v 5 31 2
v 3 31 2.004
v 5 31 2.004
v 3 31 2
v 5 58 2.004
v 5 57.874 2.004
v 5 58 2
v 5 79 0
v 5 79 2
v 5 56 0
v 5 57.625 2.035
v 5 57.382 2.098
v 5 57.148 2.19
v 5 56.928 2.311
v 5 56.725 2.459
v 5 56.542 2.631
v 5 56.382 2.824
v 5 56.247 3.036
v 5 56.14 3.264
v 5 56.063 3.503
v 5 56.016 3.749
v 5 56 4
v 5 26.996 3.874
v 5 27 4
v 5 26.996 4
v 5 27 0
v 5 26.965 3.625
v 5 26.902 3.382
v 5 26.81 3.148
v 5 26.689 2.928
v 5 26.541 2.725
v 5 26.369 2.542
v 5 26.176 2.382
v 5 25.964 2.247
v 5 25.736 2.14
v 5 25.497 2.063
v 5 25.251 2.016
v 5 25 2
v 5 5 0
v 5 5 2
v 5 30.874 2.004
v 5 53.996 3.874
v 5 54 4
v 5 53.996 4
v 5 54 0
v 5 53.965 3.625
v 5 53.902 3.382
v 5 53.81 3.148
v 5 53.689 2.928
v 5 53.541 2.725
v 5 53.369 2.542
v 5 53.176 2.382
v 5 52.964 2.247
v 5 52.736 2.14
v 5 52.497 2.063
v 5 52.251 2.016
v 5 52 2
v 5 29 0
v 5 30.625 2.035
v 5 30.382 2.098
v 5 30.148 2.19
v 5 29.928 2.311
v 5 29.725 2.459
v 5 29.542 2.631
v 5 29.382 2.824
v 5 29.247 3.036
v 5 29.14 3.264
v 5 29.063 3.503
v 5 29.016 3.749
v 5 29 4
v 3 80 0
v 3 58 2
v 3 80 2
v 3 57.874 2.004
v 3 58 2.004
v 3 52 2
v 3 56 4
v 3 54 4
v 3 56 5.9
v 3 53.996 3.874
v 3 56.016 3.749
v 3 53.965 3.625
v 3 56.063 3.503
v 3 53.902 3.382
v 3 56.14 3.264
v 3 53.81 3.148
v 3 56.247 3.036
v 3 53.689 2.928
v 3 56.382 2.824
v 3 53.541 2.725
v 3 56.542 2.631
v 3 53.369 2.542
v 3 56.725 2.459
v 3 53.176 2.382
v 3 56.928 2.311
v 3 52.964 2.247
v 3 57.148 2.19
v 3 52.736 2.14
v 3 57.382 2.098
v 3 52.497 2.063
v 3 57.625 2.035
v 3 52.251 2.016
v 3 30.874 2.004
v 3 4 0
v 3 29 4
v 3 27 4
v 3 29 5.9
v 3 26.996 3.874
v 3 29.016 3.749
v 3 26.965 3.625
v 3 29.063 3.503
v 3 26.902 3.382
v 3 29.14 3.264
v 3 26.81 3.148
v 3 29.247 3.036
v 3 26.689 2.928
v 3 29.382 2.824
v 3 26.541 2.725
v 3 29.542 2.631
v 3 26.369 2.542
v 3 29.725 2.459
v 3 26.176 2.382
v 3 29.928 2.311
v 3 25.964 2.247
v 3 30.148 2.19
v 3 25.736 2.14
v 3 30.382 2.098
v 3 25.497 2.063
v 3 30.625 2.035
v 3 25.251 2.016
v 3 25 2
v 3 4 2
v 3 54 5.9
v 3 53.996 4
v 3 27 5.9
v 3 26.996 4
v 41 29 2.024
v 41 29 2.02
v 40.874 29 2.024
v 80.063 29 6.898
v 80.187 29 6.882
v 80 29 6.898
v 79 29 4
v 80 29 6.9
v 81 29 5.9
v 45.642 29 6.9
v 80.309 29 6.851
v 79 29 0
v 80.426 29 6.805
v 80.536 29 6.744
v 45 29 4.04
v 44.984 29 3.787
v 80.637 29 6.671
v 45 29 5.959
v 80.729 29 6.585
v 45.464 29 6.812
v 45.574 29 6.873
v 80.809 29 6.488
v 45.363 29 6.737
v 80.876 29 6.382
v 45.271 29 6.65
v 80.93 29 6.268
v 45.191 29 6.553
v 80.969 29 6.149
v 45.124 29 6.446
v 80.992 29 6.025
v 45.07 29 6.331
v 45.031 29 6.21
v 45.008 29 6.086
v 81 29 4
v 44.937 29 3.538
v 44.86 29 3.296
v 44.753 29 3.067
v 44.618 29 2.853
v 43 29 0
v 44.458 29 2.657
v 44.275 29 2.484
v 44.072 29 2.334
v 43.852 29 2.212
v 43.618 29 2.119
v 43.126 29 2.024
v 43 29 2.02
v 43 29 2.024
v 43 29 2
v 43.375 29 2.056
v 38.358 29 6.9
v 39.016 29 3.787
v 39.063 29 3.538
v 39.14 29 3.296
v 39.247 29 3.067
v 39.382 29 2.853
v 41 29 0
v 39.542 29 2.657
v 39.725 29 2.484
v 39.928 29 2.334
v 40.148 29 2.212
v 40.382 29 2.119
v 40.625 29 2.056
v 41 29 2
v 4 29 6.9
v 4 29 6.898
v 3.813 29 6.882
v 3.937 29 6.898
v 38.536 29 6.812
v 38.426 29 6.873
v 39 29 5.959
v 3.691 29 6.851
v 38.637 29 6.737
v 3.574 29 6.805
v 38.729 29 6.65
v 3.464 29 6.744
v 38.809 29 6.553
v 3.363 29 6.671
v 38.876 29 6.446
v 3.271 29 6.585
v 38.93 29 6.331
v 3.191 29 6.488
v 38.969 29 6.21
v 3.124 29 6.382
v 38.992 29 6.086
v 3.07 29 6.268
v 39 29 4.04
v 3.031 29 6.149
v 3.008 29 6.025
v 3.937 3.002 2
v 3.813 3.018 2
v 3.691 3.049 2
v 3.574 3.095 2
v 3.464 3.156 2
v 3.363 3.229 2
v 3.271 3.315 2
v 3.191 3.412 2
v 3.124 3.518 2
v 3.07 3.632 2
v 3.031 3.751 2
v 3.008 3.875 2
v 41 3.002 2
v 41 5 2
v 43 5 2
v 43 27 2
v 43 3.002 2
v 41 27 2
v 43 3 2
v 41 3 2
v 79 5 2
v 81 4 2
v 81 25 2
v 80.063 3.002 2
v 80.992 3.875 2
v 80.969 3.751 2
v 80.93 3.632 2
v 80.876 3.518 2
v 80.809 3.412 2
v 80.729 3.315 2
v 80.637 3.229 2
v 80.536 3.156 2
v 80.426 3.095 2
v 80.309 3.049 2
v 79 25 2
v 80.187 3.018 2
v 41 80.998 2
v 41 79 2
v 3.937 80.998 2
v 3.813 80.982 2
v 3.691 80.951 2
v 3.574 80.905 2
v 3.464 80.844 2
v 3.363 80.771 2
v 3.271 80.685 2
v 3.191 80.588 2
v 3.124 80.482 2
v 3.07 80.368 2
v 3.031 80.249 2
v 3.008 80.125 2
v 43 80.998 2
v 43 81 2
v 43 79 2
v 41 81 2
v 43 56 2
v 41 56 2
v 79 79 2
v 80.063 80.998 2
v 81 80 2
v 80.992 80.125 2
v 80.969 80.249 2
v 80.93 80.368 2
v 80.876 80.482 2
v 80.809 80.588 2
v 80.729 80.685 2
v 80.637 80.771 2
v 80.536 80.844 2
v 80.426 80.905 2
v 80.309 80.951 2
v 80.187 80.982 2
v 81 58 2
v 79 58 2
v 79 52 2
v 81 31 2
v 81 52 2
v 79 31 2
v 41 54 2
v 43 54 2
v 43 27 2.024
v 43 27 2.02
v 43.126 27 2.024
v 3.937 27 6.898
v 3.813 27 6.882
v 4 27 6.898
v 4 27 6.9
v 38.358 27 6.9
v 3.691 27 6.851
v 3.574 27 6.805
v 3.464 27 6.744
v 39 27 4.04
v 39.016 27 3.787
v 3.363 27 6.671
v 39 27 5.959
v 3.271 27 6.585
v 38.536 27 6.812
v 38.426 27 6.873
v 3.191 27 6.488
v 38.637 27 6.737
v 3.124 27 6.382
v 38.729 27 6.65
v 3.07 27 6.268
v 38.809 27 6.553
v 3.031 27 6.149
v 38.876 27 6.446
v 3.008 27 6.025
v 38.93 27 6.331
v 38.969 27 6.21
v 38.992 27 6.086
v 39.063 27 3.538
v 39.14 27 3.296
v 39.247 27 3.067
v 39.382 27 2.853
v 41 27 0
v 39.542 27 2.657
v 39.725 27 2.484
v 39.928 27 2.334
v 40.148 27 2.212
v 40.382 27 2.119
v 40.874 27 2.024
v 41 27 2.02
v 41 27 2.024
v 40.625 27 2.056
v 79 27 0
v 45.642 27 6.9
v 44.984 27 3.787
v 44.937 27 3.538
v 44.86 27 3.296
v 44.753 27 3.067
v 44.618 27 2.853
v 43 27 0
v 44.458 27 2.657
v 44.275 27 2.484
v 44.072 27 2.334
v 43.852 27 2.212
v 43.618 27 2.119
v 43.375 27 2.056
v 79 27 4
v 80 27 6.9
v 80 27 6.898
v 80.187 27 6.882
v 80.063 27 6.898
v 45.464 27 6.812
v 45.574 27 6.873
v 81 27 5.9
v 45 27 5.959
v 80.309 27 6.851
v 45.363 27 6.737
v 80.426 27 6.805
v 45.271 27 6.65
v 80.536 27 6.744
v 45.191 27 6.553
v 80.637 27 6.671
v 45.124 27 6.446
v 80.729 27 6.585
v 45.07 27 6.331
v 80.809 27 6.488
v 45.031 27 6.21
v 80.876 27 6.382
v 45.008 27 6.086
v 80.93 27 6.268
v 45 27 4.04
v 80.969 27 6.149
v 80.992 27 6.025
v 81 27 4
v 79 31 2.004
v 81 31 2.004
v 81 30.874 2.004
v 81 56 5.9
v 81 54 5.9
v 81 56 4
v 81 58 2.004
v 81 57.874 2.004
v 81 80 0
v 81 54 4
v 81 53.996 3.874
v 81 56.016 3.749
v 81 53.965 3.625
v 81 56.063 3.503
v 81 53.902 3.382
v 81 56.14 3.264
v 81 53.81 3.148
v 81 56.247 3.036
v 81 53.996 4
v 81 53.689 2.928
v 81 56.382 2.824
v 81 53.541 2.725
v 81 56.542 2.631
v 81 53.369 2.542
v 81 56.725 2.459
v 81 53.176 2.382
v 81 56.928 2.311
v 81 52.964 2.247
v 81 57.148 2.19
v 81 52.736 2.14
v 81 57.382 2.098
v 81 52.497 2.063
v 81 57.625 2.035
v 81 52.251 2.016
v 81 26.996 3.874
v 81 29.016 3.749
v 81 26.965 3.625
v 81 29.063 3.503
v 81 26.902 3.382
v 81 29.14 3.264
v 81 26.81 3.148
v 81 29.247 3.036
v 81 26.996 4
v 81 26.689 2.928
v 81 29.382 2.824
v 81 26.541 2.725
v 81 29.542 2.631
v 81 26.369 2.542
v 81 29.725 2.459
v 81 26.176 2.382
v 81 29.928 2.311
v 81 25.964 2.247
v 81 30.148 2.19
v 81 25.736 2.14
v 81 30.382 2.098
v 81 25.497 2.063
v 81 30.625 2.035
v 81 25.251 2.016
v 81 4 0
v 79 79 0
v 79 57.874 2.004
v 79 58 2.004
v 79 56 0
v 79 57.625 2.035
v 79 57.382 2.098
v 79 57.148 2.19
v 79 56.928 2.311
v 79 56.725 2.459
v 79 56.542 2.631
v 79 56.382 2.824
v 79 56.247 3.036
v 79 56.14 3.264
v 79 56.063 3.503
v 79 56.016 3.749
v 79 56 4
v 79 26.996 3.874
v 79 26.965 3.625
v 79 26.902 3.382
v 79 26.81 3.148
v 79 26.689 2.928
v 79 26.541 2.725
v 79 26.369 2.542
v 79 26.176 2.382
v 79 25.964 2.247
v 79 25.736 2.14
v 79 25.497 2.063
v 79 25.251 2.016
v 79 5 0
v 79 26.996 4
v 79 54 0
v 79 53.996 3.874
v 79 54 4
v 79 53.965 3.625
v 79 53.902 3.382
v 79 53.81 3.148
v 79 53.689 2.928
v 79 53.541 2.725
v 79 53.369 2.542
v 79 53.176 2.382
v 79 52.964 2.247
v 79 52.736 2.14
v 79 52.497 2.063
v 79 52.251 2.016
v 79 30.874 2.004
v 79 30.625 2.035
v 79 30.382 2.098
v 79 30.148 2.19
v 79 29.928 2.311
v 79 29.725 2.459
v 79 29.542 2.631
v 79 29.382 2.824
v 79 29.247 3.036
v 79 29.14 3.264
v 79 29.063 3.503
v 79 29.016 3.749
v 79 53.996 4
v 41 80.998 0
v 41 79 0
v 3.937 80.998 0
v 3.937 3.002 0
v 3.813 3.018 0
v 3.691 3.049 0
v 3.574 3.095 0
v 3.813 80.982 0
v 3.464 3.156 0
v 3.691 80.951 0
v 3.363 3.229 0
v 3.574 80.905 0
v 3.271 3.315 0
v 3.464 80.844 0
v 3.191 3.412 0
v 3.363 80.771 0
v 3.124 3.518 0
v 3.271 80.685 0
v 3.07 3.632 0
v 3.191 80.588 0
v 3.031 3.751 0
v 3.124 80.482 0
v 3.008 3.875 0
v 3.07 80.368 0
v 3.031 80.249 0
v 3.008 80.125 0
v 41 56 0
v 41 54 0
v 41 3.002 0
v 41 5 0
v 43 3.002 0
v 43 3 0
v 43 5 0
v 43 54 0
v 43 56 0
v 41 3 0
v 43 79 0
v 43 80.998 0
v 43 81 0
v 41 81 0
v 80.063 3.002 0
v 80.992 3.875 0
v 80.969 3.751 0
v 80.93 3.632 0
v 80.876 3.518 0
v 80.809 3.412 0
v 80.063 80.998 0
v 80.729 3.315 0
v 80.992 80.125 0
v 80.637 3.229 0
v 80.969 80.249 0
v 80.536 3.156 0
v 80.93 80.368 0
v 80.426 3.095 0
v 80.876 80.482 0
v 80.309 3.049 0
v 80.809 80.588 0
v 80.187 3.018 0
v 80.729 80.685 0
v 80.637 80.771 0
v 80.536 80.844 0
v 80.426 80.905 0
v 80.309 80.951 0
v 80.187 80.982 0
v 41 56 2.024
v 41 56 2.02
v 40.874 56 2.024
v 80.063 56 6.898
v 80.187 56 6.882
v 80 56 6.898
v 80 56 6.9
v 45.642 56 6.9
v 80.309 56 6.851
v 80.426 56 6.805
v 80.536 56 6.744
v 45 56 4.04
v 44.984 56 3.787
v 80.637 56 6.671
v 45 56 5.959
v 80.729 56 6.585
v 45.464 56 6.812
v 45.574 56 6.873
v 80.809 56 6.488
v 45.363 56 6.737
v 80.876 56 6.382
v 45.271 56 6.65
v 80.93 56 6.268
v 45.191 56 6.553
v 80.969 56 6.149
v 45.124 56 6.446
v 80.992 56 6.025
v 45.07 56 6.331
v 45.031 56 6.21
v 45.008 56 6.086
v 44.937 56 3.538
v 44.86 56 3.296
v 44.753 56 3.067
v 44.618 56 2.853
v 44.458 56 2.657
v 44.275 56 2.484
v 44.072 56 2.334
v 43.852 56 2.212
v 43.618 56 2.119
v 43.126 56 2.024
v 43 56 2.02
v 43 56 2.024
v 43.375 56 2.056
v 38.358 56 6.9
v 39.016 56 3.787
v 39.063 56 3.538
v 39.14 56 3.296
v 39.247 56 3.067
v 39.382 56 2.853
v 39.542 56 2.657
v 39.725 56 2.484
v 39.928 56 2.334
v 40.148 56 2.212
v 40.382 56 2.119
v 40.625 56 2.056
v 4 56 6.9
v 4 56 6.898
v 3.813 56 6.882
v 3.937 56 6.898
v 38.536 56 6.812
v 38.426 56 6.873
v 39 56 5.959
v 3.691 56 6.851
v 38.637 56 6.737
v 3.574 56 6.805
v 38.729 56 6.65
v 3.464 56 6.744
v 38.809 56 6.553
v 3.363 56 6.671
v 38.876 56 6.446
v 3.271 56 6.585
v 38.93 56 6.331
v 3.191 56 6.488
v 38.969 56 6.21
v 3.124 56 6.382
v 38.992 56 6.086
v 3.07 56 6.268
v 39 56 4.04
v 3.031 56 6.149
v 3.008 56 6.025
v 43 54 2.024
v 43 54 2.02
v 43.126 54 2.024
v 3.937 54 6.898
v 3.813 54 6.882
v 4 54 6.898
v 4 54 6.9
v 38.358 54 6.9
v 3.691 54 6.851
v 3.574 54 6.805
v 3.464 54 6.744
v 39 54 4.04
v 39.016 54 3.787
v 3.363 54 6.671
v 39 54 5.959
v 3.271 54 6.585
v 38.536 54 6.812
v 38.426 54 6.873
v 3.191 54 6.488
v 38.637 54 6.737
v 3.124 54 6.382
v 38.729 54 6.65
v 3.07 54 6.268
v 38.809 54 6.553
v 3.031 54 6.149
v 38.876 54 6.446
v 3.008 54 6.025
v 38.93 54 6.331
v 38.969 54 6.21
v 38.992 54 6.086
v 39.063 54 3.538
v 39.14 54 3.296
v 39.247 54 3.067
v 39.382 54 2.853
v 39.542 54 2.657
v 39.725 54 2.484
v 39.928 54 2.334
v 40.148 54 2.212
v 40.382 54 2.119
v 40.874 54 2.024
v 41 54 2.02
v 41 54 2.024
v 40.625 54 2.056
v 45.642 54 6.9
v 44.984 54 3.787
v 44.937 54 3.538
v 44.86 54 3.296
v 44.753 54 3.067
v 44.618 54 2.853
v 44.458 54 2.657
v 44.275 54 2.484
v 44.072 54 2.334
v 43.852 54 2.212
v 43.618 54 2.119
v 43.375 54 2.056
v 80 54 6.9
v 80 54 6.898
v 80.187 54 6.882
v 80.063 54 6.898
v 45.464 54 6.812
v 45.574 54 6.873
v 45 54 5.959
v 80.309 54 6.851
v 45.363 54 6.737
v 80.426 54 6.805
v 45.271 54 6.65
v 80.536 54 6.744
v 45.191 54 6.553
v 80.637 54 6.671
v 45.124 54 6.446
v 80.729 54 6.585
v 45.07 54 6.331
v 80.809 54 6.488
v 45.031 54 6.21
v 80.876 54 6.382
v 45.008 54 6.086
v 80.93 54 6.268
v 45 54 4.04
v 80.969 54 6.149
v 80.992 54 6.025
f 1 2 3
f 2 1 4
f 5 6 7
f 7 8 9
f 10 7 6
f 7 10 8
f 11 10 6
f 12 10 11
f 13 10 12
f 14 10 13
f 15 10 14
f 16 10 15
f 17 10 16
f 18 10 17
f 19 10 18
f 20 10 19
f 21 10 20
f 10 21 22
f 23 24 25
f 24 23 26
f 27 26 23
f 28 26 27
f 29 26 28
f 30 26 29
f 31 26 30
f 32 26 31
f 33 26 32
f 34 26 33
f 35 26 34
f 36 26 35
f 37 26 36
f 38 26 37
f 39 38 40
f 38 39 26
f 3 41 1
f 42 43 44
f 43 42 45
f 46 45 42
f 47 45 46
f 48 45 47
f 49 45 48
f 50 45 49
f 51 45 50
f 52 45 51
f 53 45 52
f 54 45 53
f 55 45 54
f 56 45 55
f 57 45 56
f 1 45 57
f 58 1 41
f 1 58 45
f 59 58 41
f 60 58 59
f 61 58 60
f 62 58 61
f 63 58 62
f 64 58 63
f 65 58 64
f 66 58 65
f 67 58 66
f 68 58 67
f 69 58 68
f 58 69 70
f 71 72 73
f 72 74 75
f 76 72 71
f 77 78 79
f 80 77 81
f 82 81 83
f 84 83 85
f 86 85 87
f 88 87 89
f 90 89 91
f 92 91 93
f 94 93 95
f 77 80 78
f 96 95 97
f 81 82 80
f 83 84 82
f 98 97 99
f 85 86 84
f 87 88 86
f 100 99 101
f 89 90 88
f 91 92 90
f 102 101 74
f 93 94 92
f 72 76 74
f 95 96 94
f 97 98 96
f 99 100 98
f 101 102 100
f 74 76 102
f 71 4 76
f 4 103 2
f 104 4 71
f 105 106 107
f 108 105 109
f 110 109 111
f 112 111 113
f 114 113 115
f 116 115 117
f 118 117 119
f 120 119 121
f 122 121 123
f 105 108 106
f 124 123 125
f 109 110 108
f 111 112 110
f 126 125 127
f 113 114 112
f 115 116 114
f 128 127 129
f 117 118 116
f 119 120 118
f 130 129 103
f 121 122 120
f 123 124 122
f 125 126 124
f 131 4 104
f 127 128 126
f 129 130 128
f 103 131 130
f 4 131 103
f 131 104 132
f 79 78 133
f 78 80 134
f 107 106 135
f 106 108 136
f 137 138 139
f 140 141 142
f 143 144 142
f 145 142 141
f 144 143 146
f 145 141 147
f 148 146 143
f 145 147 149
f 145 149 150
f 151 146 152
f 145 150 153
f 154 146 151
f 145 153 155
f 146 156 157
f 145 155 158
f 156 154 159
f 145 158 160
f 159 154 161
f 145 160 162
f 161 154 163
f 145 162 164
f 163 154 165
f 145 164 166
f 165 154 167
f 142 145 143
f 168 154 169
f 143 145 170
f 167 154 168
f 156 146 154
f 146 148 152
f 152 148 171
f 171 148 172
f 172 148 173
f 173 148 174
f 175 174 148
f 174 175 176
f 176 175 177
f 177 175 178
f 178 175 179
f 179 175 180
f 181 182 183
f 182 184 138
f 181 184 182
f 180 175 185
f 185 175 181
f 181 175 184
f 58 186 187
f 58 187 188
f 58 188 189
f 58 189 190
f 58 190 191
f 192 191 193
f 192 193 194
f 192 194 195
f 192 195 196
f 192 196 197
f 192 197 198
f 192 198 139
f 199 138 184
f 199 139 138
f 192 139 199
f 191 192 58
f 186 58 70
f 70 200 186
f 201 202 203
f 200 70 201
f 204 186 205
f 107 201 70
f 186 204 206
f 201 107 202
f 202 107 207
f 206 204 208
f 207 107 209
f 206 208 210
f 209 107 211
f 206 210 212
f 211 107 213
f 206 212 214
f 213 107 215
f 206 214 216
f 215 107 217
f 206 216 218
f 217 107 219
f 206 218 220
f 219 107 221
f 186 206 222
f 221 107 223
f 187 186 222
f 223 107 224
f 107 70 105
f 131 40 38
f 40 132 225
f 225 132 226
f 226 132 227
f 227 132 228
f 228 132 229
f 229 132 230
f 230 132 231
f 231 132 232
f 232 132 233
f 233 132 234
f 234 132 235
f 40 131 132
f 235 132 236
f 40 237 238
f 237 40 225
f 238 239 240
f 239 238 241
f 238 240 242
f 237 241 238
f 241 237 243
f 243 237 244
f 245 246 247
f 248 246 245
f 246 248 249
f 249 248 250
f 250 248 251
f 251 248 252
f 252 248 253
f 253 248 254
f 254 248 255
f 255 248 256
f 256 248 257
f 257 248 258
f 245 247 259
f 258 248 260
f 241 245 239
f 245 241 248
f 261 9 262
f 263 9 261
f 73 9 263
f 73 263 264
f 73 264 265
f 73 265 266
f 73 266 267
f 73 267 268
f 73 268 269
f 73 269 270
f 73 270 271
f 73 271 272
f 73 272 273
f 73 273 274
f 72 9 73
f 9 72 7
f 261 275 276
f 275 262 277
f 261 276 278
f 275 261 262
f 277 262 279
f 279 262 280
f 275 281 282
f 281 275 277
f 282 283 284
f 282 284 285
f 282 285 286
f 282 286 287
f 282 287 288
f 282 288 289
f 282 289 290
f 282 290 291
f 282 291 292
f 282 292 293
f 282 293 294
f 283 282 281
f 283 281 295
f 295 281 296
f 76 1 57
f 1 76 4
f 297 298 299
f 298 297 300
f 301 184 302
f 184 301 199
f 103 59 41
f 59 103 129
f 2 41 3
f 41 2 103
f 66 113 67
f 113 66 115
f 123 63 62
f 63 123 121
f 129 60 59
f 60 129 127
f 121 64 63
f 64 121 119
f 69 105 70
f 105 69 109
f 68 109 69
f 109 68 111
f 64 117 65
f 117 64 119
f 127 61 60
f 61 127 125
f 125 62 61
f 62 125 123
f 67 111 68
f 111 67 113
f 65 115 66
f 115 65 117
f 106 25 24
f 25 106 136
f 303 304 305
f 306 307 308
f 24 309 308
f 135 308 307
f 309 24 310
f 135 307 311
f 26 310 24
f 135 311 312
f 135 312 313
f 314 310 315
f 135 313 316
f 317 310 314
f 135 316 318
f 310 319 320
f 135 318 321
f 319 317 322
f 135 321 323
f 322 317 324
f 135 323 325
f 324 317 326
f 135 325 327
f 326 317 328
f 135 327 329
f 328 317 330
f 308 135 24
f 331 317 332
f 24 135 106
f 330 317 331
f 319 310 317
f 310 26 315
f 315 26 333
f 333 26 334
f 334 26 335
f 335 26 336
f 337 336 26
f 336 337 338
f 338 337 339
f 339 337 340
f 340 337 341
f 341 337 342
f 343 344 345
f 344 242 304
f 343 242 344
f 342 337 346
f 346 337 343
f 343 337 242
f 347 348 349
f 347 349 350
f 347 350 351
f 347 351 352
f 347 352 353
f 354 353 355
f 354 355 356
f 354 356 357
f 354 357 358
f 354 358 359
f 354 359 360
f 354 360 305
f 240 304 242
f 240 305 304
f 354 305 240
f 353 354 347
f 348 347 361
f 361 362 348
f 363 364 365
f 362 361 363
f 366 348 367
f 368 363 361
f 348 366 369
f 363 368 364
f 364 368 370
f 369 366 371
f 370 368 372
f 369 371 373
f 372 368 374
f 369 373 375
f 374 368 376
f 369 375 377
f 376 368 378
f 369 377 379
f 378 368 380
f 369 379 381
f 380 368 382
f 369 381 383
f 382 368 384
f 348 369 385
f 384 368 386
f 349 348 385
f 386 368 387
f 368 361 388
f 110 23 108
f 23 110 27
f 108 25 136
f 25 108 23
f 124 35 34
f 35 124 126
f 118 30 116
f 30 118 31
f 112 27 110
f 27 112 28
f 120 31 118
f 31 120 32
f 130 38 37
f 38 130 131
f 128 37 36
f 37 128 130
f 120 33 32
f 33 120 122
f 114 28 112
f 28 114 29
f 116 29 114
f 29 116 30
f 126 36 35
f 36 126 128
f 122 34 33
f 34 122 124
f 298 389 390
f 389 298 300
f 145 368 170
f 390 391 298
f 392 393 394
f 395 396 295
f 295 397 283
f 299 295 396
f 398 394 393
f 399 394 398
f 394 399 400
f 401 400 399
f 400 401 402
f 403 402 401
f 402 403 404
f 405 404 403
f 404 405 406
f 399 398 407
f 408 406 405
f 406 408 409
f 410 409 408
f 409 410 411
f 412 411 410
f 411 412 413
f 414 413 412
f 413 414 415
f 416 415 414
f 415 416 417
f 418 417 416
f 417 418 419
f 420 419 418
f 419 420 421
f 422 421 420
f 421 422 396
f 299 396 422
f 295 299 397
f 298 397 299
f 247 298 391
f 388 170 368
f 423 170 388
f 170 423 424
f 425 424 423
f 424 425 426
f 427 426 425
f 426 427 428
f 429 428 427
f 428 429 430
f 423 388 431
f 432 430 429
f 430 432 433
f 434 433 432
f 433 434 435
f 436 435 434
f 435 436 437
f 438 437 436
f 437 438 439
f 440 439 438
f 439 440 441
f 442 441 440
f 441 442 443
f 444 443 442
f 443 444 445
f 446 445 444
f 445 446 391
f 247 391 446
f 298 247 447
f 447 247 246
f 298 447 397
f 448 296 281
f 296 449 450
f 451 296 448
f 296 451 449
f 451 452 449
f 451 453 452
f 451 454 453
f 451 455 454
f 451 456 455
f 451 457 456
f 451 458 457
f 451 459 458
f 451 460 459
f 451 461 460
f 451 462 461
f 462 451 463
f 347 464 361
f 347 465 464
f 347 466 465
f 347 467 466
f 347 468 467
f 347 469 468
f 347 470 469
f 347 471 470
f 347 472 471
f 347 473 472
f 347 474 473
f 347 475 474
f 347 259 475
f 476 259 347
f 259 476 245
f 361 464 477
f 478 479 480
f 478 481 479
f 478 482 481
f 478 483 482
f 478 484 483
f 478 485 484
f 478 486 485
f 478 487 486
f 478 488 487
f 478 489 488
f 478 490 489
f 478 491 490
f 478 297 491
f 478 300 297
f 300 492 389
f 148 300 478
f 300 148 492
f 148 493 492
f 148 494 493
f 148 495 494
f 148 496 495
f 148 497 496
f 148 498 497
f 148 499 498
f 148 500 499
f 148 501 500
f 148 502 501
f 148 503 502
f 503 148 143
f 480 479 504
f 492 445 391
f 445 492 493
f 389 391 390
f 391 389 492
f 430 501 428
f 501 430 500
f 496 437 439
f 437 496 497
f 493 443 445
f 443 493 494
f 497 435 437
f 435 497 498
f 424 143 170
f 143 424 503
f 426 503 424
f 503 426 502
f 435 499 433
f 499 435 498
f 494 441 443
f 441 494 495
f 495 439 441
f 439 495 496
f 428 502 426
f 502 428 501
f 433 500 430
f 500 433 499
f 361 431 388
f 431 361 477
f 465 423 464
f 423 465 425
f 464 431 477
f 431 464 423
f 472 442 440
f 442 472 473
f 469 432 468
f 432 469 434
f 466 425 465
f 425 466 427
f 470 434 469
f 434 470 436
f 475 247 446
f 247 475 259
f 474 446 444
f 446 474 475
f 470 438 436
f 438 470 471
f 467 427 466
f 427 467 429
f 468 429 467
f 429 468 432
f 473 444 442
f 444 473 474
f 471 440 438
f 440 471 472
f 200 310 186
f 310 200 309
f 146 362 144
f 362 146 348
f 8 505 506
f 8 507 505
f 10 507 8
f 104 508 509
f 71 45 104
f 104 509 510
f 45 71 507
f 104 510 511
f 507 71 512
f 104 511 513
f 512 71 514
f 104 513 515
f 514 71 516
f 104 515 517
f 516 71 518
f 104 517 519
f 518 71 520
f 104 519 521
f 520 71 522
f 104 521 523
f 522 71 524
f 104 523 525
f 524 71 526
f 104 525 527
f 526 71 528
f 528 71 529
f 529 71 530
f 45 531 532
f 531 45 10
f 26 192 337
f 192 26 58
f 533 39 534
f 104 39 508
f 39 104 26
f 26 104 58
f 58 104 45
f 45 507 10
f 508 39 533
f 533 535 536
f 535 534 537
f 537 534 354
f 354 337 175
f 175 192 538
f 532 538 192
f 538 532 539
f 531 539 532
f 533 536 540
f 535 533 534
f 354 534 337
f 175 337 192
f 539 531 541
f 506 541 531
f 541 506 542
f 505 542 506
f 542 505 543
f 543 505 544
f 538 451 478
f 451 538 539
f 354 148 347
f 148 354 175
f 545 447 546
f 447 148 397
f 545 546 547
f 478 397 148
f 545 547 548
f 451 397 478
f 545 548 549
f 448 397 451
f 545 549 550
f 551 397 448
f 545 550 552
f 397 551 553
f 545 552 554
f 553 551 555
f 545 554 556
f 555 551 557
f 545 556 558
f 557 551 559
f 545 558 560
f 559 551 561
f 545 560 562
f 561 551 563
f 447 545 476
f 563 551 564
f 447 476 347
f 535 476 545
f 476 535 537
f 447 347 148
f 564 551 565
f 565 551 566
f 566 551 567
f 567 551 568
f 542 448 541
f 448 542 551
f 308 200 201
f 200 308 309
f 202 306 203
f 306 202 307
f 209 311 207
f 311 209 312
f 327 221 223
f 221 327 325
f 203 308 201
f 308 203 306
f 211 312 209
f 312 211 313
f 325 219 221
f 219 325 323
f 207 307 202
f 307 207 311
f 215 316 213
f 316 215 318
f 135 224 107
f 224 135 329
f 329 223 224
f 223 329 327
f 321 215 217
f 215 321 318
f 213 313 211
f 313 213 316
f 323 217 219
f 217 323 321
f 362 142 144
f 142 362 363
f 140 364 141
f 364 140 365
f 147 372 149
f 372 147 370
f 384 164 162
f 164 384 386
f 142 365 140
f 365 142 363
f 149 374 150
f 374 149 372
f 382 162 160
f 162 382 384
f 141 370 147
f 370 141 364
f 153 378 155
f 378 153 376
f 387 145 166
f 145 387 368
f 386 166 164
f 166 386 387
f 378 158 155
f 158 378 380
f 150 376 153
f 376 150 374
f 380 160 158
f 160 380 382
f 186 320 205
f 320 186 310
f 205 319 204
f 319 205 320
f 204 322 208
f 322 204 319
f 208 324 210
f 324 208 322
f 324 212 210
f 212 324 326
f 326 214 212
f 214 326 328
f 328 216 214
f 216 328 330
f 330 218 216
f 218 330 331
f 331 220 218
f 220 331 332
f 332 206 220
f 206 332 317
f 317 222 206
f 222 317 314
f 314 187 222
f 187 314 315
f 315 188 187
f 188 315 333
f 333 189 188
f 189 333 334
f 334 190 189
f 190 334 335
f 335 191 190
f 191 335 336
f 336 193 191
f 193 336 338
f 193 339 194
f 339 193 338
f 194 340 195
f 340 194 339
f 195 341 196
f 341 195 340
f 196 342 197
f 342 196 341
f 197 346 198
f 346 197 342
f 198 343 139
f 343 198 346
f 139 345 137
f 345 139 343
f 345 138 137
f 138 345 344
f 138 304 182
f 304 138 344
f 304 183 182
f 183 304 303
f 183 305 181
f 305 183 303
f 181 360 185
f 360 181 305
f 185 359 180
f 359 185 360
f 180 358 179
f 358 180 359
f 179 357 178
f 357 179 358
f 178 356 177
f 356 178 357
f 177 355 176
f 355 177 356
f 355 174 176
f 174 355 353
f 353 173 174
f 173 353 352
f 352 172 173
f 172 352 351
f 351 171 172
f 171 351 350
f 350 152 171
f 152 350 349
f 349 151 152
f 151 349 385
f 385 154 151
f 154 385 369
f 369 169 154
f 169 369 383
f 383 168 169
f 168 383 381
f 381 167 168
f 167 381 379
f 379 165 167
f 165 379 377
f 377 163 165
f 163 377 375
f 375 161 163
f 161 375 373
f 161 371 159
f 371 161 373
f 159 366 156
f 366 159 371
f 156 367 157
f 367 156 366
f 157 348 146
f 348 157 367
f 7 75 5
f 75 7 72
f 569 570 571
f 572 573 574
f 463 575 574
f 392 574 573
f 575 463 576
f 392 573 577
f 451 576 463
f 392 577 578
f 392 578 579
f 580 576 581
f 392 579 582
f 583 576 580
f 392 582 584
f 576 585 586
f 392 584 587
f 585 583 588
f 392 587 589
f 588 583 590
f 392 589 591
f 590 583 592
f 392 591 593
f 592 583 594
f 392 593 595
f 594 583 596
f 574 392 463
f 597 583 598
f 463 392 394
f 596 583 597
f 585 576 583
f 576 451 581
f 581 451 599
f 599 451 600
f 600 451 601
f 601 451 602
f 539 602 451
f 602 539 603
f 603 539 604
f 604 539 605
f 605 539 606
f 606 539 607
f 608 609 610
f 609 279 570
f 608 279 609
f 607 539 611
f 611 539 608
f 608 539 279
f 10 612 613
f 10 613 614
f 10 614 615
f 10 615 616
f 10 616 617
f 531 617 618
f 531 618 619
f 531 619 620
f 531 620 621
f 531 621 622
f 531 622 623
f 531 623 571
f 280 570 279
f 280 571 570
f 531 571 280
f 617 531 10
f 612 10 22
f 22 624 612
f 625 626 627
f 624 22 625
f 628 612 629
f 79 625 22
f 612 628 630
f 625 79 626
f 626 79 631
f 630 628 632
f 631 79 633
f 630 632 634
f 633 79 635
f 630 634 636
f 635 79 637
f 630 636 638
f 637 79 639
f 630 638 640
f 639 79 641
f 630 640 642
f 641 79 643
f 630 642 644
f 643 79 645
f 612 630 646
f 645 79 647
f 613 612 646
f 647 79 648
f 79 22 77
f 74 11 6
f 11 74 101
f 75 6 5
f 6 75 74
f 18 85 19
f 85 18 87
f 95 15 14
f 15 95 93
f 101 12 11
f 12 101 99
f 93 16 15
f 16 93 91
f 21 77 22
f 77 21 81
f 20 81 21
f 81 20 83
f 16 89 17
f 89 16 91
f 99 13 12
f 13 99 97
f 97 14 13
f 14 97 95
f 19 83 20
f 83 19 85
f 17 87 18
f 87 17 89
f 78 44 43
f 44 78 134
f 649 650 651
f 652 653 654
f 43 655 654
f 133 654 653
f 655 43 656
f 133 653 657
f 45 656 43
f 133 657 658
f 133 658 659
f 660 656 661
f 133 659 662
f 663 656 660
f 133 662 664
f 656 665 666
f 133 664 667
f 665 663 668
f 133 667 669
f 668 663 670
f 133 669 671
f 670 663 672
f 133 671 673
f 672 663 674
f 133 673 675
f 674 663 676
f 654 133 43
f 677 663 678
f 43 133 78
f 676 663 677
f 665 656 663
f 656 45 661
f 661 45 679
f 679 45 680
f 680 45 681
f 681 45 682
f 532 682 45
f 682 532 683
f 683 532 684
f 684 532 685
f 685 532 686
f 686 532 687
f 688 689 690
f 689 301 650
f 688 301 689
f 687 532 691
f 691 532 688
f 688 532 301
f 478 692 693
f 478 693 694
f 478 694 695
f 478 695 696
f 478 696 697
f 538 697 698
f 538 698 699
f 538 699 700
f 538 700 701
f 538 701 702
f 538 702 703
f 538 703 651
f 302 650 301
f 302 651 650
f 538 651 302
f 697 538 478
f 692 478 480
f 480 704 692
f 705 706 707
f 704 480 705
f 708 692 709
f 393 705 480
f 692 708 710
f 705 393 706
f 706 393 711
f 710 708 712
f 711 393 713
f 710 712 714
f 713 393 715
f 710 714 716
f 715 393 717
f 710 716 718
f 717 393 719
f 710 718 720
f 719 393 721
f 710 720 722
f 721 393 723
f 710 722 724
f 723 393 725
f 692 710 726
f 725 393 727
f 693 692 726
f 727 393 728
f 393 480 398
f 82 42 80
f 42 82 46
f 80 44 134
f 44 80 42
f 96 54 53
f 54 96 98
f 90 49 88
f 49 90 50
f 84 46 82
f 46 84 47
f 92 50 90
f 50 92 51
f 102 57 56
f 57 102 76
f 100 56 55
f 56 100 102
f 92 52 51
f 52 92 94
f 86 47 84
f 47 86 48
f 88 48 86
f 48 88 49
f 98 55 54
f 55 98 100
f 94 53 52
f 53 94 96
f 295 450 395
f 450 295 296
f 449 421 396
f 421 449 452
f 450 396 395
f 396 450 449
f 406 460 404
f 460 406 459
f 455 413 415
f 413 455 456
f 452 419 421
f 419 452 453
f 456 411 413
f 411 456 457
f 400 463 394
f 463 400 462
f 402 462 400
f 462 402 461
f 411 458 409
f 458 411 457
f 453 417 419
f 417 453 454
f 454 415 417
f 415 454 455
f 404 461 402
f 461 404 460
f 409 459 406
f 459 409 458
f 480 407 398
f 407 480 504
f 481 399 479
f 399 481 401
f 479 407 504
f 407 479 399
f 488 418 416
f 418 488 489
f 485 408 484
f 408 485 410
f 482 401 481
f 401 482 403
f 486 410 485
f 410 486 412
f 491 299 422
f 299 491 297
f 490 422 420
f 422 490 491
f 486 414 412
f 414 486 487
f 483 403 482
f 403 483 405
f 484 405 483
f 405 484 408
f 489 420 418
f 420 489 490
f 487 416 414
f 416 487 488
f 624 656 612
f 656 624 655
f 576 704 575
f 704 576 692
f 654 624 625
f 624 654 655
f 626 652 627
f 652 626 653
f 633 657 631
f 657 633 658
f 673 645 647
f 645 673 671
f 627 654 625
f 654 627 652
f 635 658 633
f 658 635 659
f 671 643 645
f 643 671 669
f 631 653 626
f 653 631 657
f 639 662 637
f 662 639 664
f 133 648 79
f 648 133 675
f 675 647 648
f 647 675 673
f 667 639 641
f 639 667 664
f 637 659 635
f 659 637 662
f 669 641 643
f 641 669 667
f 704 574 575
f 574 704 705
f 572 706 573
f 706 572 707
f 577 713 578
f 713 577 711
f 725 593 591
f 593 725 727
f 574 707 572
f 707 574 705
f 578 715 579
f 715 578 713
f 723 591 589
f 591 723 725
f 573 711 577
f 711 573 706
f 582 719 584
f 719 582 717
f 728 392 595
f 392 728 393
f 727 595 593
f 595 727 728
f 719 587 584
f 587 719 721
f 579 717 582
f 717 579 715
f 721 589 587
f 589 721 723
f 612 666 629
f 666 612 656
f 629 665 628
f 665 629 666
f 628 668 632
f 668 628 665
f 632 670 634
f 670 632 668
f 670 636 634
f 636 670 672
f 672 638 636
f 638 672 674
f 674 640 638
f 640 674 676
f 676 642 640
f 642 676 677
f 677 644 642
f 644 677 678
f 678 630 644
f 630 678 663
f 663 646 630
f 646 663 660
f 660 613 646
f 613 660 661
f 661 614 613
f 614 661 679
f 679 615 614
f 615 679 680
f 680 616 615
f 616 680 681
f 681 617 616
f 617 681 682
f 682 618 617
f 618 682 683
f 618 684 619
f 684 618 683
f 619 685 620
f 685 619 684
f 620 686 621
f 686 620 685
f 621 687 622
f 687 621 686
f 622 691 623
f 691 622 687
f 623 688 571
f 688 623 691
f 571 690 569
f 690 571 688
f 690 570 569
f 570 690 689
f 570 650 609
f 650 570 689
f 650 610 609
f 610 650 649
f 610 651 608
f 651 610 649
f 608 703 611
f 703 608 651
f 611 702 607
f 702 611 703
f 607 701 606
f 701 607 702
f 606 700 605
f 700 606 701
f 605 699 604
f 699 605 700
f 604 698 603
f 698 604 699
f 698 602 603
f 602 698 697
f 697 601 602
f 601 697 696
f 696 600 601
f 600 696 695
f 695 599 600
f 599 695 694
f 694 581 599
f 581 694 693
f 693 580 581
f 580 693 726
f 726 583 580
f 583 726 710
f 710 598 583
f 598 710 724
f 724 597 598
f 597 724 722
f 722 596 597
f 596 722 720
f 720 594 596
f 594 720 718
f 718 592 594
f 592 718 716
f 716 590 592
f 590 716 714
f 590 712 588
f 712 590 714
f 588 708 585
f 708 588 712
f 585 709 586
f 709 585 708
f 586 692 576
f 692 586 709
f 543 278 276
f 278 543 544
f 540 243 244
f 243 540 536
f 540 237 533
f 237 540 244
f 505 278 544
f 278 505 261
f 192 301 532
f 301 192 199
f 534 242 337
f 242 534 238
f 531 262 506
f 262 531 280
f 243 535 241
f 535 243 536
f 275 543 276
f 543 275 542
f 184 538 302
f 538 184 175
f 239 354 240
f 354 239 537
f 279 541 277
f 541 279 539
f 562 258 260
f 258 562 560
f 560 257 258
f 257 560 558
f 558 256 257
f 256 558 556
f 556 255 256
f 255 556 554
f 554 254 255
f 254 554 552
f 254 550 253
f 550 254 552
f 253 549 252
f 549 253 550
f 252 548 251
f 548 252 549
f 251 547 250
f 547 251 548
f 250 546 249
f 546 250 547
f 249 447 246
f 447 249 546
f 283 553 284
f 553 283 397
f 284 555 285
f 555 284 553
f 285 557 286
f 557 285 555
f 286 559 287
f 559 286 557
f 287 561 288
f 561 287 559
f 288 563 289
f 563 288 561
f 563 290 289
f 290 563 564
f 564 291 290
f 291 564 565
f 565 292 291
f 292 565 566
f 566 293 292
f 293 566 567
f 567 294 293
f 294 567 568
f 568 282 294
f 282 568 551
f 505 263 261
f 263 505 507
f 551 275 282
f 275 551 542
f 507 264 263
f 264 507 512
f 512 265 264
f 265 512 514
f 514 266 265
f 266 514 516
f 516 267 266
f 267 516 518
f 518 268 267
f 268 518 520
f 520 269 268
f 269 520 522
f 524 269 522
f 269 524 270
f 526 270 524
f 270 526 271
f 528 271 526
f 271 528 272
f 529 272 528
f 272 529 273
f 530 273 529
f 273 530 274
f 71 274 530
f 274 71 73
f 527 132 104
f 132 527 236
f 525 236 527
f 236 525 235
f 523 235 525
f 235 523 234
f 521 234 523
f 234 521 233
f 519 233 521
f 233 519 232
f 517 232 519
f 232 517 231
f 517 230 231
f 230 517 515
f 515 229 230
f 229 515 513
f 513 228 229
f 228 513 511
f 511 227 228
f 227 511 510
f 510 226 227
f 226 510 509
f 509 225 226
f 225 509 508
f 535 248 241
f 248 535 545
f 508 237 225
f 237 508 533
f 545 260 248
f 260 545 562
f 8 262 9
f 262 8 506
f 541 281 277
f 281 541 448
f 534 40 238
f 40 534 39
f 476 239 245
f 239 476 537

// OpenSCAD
/////////////////////////////////////////////// 
/////// Edit the following settings /////////// 
/////////////////////////////////////////////// 
 
// How many grid spaces does the bin take up
gridx = 2; // Grid Cols
gridy = 2; // Grid Rows

// How many divisions in each direction
divx = 2; // Cols
divy = 3; // Rows

/////////////////////////////////////////////// 
///////////   Global Settings   /////////////// 
/////// Should not need to changed  /////////// 
/////////////////////////////////////////////// 
$fn=50;          // Generates smoother rounded edges
GRID_DIMENSIONS_MM = [42, 42];
LIP_OFFSET = 3;  // Offest from side of bin so spacer lays on ledge
THICKNESS = 2;   // Wall thickness
RADIUS = 1;      // Radius
TOLERANCE = .5;  // Tolerance for bins
HEIGHT = 6.9;    // Total height with dividers

/////////////////////////////////////////////// 
/////// Shouldn't need to edit below ////////// 
/////////////////////////////////////////////// 
/////////////////////////////////////////////// 
/////////////////////////////////////////////// 


// Computed Variables
total_x_length = GRID_DIMENSIONS_MM.x * gridx;
total_y_length = GRID_DIMENSIONS_MM.x * gridy;
spacer_x_length = total_x_length - (LIP_OFFSET * 2);
spacer_y_length = total_y_length - (LIP_OFFSET * 2);
sub_div_x = divx - 1;
sub_div_y = divy - 1;
spacing_x = total_x_length / divx;
spacing_y = total_y_length / divy;
radius_fillet = RADIUS;

// Debugging is off if asterix is before.
*debugging();
// Run main module
main();

module main() {
    union(){
        color("red")
        base();
        color("green")
        cross_members();
    }
}

// Spacer base
module base() {
    translate([LIP_OFFSET, LIP_OFFSET])
    linear_extrude(THICKNESS)
    difference(){
        
        // Accounts for radius for minkowski
        l_x = spacer_x_length - (RADIUS * 2); 
        l_y = spacer_y_length - (RADIUS * 2); 
        
        // Outline of base
        translate([radius_fillet, radius_fillet])
        minkowski(){
            square([l_x, l_y]);
            circle(radius_fillet);
        };
        
        // Cut out for base contracting shape for thickness
        l_x2 = spacer_x_length - (THICKNESS * 2); 
        l_y2 = spacer_y_length - (THICKNESS * 2); 
        
        // Base cutout
        translate([2,2])
        square([l_x2, l_y2]);
    }
};

// Generates all the cross bars
module cross_members() {
    // Create X cross member(s)
    for (i = [1:sub_div_x]) {
        translate([i * spacing_x , 0, 0])
        translate([-1 * (THICKNESS / 2), LIP_OFFSET])
        if((i * spacing_x) % GRID_DIMENSIONS_MM.x == 0) {
            spacer_bar(spacer_y_length, 90, false);
        } else {
            spacer_bar(spacer_y_length, 90, true);
        }
    }
 
    // Create Y cross member(s)
    for (i = [1:sub_div_y]) {
        translate([0, i * spacing_y , 0])
        translate([LIP_OFFSET, -i * (THICKNESS / 2)])
        if((i * spacing_y) % GRID_DIMENSIONS_MM.y == 0) {
            spacer_bar(spacer_x_length, 0, false);
        } else {
            spacer_bar(spacer_x_length, 0, true);
        }
    }
};

// Generates each bar based open length, rotation, height, and location
module spacer_bar(length, rotation = 0, full = true) {
    translate( rotation == 0 ? [ 0, 0, 0 ] : [ 2, 0, 0 ] )
    rotate([0, 0, rotation]){
        if (full) {
            difference() {
                union(){
                    edge_bottom();
                    translate([length - THICKNESS, 0, 0])
                    edge_bottom();
                    cube([length, THICKNESS, HEIGHT]);
                }
                
                translate([0, -.1, 0])
                scale([1,1.1,1])
                translate([0, 0, 6.9])
                rotate([90,0,90])
                corner(1, 1);
                
                translate([0, -.1, 0])
                scale([1,1.1,1])
                translate([length, THICKNESS, 6.9])
                rotate([90,0,270])
                corner(1, 1);
                
                for (i = [GRID_DIMENSIONS_MM.x:GRID_DIMENSIONS_MM.x:length]){
                    color("RED");
                    scale([1, 1.2, 1.01])
                    translate([i - LIP_OFFSET, THICKNESS/2 -.1, 2])
                    negative_center();
                };
            };
        } else {
            cube([length, THICKNESS, THICKNESS]);
        }

    };
}

// This is the shape used for removal from cross section where top fits
module negative_center () {
    translate([-3, THICKNESS / 2, 2])
    rotate([90])
    linear_extrude(THICKNESS)
    union(){
        square([6, 2.9]);
        
        translate([2, 0, 0])
        circle(2);
        
        translate([4, 0, 0])
        circle(2);
        
        translate([2,-2, 0])
        square([2,2]);
        
        // Top left inverted corner
        difference(){
            translate([-1, 1.9])
            square([1, 1]);
            translate([-1, 1.9])
            circle(1);
        };
        // Top right inverted corner
        difference(){
            translate([6, 1.9])
            square([1, 1]);
            translate([7, 1.9])
            circle(1);
        };
    };
}

// Creates a spaced double inverted corner for cross members
module edge_bottom() {
    translate([0,THICKNESS,THICKNESS])
    rotate([-90,0,0])
    corner();
    translate([0, 0, THICKNESS])
    corner();
};

// Ceates a single inverted corner
module corner(negative = 0, radius = 2) {
    rotate([0,270,180])
    difference(){
        if (!negative) {
            cube([radius, radius, THICKNESS]);
        } else {
            translate([-radius, -radius, 0])
            cube([radius*2, radius*2, THICKNESS]);
        }
        translate([radius, radius, -.1])
        cylinder(r=radius, h=THICKNESS+.2);
    };
};

// Used for debugging
module debugging() {
    echo ("-------");
    echo ("-------");
    echo("Total X Length :", total_x_length);
    echo("Total Y Length :", total_y_length);
    echo("Spacer Y Length :", spacer_x_length);
    echo("Spacer Y Length :", spacer_y_length);
    echo("Subdivisions X :", sub_div_x);
    echo("Subdivisions Y :", sub_div_y);
    echo("Spacing X :", spacing_x);
    echo("Spacing Y :", spacing_y);
    echo("Radius :", radius_fillet);
    echo ("-------");
    echo ("-------");
    
    //Base
    color("pink")
    translate([0,0,-1])
    square([total_x_length, total_y_length]);
}
